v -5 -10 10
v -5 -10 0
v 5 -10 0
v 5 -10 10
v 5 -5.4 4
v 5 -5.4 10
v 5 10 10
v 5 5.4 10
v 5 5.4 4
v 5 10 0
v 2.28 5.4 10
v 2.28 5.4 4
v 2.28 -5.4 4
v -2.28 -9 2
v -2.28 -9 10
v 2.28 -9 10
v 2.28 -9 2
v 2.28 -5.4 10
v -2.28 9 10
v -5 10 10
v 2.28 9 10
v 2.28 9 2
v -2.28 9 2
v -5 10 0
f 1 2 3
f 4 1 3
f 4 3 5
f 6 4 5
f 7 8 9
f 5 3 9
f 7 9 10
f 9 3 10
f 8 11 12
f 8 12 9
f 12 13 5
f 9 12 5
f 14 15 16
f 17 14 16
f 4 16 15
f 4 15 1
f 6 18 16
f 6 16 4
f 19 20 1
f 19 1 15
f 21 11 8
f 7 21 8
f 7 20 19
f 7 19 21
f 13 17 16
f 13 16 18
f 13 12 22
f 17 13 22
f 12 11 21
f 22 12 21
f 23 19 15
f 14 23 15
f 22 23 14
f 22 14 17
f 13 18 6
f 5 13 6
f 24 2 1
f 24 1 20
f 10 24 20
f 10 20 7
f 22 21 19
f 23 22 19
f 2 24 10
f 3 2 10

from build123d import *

# Parameters (mm, degrees)
F0_W     = 10
F0_H     = 20
F1_DEPTH = 10
F3_DEPTH = 8
F2_W     = 2.72019
F2_H     = 10.8
F4_DEPTH = 6


with BuildPart() as f1:
    # F0 (on Top) → F1 (new body)
    with BuildSketch(Plane.XY):
        Rectangle(F0_W, F0_H)
    extrude(amount=F1_DEPTH)

    # F2 (on face) → F3 (cut)
    with BuildSketch(Plane.XY.offset(10)):
        Polygon((2.27981, 5.4), (2.27981, 9), (-2.27981, 9), (-2.27981, -9), (2.27981, -9), (2.27981, -5.4), align=None)
    extrude(amount=-F3_DEPTH, mode=Mode.SUBTRACT)

    # F2 (on face) → F4 (cut)
    with BuildSketch(Plane.XY.offset(10)):
        with Locations((3.639905, 0)):
            Rectangle(F2_W, F2_H)
    extrude(amount=-F4_DEPTH, mode=Mode.SUBTRACT)


solid = f1.part
